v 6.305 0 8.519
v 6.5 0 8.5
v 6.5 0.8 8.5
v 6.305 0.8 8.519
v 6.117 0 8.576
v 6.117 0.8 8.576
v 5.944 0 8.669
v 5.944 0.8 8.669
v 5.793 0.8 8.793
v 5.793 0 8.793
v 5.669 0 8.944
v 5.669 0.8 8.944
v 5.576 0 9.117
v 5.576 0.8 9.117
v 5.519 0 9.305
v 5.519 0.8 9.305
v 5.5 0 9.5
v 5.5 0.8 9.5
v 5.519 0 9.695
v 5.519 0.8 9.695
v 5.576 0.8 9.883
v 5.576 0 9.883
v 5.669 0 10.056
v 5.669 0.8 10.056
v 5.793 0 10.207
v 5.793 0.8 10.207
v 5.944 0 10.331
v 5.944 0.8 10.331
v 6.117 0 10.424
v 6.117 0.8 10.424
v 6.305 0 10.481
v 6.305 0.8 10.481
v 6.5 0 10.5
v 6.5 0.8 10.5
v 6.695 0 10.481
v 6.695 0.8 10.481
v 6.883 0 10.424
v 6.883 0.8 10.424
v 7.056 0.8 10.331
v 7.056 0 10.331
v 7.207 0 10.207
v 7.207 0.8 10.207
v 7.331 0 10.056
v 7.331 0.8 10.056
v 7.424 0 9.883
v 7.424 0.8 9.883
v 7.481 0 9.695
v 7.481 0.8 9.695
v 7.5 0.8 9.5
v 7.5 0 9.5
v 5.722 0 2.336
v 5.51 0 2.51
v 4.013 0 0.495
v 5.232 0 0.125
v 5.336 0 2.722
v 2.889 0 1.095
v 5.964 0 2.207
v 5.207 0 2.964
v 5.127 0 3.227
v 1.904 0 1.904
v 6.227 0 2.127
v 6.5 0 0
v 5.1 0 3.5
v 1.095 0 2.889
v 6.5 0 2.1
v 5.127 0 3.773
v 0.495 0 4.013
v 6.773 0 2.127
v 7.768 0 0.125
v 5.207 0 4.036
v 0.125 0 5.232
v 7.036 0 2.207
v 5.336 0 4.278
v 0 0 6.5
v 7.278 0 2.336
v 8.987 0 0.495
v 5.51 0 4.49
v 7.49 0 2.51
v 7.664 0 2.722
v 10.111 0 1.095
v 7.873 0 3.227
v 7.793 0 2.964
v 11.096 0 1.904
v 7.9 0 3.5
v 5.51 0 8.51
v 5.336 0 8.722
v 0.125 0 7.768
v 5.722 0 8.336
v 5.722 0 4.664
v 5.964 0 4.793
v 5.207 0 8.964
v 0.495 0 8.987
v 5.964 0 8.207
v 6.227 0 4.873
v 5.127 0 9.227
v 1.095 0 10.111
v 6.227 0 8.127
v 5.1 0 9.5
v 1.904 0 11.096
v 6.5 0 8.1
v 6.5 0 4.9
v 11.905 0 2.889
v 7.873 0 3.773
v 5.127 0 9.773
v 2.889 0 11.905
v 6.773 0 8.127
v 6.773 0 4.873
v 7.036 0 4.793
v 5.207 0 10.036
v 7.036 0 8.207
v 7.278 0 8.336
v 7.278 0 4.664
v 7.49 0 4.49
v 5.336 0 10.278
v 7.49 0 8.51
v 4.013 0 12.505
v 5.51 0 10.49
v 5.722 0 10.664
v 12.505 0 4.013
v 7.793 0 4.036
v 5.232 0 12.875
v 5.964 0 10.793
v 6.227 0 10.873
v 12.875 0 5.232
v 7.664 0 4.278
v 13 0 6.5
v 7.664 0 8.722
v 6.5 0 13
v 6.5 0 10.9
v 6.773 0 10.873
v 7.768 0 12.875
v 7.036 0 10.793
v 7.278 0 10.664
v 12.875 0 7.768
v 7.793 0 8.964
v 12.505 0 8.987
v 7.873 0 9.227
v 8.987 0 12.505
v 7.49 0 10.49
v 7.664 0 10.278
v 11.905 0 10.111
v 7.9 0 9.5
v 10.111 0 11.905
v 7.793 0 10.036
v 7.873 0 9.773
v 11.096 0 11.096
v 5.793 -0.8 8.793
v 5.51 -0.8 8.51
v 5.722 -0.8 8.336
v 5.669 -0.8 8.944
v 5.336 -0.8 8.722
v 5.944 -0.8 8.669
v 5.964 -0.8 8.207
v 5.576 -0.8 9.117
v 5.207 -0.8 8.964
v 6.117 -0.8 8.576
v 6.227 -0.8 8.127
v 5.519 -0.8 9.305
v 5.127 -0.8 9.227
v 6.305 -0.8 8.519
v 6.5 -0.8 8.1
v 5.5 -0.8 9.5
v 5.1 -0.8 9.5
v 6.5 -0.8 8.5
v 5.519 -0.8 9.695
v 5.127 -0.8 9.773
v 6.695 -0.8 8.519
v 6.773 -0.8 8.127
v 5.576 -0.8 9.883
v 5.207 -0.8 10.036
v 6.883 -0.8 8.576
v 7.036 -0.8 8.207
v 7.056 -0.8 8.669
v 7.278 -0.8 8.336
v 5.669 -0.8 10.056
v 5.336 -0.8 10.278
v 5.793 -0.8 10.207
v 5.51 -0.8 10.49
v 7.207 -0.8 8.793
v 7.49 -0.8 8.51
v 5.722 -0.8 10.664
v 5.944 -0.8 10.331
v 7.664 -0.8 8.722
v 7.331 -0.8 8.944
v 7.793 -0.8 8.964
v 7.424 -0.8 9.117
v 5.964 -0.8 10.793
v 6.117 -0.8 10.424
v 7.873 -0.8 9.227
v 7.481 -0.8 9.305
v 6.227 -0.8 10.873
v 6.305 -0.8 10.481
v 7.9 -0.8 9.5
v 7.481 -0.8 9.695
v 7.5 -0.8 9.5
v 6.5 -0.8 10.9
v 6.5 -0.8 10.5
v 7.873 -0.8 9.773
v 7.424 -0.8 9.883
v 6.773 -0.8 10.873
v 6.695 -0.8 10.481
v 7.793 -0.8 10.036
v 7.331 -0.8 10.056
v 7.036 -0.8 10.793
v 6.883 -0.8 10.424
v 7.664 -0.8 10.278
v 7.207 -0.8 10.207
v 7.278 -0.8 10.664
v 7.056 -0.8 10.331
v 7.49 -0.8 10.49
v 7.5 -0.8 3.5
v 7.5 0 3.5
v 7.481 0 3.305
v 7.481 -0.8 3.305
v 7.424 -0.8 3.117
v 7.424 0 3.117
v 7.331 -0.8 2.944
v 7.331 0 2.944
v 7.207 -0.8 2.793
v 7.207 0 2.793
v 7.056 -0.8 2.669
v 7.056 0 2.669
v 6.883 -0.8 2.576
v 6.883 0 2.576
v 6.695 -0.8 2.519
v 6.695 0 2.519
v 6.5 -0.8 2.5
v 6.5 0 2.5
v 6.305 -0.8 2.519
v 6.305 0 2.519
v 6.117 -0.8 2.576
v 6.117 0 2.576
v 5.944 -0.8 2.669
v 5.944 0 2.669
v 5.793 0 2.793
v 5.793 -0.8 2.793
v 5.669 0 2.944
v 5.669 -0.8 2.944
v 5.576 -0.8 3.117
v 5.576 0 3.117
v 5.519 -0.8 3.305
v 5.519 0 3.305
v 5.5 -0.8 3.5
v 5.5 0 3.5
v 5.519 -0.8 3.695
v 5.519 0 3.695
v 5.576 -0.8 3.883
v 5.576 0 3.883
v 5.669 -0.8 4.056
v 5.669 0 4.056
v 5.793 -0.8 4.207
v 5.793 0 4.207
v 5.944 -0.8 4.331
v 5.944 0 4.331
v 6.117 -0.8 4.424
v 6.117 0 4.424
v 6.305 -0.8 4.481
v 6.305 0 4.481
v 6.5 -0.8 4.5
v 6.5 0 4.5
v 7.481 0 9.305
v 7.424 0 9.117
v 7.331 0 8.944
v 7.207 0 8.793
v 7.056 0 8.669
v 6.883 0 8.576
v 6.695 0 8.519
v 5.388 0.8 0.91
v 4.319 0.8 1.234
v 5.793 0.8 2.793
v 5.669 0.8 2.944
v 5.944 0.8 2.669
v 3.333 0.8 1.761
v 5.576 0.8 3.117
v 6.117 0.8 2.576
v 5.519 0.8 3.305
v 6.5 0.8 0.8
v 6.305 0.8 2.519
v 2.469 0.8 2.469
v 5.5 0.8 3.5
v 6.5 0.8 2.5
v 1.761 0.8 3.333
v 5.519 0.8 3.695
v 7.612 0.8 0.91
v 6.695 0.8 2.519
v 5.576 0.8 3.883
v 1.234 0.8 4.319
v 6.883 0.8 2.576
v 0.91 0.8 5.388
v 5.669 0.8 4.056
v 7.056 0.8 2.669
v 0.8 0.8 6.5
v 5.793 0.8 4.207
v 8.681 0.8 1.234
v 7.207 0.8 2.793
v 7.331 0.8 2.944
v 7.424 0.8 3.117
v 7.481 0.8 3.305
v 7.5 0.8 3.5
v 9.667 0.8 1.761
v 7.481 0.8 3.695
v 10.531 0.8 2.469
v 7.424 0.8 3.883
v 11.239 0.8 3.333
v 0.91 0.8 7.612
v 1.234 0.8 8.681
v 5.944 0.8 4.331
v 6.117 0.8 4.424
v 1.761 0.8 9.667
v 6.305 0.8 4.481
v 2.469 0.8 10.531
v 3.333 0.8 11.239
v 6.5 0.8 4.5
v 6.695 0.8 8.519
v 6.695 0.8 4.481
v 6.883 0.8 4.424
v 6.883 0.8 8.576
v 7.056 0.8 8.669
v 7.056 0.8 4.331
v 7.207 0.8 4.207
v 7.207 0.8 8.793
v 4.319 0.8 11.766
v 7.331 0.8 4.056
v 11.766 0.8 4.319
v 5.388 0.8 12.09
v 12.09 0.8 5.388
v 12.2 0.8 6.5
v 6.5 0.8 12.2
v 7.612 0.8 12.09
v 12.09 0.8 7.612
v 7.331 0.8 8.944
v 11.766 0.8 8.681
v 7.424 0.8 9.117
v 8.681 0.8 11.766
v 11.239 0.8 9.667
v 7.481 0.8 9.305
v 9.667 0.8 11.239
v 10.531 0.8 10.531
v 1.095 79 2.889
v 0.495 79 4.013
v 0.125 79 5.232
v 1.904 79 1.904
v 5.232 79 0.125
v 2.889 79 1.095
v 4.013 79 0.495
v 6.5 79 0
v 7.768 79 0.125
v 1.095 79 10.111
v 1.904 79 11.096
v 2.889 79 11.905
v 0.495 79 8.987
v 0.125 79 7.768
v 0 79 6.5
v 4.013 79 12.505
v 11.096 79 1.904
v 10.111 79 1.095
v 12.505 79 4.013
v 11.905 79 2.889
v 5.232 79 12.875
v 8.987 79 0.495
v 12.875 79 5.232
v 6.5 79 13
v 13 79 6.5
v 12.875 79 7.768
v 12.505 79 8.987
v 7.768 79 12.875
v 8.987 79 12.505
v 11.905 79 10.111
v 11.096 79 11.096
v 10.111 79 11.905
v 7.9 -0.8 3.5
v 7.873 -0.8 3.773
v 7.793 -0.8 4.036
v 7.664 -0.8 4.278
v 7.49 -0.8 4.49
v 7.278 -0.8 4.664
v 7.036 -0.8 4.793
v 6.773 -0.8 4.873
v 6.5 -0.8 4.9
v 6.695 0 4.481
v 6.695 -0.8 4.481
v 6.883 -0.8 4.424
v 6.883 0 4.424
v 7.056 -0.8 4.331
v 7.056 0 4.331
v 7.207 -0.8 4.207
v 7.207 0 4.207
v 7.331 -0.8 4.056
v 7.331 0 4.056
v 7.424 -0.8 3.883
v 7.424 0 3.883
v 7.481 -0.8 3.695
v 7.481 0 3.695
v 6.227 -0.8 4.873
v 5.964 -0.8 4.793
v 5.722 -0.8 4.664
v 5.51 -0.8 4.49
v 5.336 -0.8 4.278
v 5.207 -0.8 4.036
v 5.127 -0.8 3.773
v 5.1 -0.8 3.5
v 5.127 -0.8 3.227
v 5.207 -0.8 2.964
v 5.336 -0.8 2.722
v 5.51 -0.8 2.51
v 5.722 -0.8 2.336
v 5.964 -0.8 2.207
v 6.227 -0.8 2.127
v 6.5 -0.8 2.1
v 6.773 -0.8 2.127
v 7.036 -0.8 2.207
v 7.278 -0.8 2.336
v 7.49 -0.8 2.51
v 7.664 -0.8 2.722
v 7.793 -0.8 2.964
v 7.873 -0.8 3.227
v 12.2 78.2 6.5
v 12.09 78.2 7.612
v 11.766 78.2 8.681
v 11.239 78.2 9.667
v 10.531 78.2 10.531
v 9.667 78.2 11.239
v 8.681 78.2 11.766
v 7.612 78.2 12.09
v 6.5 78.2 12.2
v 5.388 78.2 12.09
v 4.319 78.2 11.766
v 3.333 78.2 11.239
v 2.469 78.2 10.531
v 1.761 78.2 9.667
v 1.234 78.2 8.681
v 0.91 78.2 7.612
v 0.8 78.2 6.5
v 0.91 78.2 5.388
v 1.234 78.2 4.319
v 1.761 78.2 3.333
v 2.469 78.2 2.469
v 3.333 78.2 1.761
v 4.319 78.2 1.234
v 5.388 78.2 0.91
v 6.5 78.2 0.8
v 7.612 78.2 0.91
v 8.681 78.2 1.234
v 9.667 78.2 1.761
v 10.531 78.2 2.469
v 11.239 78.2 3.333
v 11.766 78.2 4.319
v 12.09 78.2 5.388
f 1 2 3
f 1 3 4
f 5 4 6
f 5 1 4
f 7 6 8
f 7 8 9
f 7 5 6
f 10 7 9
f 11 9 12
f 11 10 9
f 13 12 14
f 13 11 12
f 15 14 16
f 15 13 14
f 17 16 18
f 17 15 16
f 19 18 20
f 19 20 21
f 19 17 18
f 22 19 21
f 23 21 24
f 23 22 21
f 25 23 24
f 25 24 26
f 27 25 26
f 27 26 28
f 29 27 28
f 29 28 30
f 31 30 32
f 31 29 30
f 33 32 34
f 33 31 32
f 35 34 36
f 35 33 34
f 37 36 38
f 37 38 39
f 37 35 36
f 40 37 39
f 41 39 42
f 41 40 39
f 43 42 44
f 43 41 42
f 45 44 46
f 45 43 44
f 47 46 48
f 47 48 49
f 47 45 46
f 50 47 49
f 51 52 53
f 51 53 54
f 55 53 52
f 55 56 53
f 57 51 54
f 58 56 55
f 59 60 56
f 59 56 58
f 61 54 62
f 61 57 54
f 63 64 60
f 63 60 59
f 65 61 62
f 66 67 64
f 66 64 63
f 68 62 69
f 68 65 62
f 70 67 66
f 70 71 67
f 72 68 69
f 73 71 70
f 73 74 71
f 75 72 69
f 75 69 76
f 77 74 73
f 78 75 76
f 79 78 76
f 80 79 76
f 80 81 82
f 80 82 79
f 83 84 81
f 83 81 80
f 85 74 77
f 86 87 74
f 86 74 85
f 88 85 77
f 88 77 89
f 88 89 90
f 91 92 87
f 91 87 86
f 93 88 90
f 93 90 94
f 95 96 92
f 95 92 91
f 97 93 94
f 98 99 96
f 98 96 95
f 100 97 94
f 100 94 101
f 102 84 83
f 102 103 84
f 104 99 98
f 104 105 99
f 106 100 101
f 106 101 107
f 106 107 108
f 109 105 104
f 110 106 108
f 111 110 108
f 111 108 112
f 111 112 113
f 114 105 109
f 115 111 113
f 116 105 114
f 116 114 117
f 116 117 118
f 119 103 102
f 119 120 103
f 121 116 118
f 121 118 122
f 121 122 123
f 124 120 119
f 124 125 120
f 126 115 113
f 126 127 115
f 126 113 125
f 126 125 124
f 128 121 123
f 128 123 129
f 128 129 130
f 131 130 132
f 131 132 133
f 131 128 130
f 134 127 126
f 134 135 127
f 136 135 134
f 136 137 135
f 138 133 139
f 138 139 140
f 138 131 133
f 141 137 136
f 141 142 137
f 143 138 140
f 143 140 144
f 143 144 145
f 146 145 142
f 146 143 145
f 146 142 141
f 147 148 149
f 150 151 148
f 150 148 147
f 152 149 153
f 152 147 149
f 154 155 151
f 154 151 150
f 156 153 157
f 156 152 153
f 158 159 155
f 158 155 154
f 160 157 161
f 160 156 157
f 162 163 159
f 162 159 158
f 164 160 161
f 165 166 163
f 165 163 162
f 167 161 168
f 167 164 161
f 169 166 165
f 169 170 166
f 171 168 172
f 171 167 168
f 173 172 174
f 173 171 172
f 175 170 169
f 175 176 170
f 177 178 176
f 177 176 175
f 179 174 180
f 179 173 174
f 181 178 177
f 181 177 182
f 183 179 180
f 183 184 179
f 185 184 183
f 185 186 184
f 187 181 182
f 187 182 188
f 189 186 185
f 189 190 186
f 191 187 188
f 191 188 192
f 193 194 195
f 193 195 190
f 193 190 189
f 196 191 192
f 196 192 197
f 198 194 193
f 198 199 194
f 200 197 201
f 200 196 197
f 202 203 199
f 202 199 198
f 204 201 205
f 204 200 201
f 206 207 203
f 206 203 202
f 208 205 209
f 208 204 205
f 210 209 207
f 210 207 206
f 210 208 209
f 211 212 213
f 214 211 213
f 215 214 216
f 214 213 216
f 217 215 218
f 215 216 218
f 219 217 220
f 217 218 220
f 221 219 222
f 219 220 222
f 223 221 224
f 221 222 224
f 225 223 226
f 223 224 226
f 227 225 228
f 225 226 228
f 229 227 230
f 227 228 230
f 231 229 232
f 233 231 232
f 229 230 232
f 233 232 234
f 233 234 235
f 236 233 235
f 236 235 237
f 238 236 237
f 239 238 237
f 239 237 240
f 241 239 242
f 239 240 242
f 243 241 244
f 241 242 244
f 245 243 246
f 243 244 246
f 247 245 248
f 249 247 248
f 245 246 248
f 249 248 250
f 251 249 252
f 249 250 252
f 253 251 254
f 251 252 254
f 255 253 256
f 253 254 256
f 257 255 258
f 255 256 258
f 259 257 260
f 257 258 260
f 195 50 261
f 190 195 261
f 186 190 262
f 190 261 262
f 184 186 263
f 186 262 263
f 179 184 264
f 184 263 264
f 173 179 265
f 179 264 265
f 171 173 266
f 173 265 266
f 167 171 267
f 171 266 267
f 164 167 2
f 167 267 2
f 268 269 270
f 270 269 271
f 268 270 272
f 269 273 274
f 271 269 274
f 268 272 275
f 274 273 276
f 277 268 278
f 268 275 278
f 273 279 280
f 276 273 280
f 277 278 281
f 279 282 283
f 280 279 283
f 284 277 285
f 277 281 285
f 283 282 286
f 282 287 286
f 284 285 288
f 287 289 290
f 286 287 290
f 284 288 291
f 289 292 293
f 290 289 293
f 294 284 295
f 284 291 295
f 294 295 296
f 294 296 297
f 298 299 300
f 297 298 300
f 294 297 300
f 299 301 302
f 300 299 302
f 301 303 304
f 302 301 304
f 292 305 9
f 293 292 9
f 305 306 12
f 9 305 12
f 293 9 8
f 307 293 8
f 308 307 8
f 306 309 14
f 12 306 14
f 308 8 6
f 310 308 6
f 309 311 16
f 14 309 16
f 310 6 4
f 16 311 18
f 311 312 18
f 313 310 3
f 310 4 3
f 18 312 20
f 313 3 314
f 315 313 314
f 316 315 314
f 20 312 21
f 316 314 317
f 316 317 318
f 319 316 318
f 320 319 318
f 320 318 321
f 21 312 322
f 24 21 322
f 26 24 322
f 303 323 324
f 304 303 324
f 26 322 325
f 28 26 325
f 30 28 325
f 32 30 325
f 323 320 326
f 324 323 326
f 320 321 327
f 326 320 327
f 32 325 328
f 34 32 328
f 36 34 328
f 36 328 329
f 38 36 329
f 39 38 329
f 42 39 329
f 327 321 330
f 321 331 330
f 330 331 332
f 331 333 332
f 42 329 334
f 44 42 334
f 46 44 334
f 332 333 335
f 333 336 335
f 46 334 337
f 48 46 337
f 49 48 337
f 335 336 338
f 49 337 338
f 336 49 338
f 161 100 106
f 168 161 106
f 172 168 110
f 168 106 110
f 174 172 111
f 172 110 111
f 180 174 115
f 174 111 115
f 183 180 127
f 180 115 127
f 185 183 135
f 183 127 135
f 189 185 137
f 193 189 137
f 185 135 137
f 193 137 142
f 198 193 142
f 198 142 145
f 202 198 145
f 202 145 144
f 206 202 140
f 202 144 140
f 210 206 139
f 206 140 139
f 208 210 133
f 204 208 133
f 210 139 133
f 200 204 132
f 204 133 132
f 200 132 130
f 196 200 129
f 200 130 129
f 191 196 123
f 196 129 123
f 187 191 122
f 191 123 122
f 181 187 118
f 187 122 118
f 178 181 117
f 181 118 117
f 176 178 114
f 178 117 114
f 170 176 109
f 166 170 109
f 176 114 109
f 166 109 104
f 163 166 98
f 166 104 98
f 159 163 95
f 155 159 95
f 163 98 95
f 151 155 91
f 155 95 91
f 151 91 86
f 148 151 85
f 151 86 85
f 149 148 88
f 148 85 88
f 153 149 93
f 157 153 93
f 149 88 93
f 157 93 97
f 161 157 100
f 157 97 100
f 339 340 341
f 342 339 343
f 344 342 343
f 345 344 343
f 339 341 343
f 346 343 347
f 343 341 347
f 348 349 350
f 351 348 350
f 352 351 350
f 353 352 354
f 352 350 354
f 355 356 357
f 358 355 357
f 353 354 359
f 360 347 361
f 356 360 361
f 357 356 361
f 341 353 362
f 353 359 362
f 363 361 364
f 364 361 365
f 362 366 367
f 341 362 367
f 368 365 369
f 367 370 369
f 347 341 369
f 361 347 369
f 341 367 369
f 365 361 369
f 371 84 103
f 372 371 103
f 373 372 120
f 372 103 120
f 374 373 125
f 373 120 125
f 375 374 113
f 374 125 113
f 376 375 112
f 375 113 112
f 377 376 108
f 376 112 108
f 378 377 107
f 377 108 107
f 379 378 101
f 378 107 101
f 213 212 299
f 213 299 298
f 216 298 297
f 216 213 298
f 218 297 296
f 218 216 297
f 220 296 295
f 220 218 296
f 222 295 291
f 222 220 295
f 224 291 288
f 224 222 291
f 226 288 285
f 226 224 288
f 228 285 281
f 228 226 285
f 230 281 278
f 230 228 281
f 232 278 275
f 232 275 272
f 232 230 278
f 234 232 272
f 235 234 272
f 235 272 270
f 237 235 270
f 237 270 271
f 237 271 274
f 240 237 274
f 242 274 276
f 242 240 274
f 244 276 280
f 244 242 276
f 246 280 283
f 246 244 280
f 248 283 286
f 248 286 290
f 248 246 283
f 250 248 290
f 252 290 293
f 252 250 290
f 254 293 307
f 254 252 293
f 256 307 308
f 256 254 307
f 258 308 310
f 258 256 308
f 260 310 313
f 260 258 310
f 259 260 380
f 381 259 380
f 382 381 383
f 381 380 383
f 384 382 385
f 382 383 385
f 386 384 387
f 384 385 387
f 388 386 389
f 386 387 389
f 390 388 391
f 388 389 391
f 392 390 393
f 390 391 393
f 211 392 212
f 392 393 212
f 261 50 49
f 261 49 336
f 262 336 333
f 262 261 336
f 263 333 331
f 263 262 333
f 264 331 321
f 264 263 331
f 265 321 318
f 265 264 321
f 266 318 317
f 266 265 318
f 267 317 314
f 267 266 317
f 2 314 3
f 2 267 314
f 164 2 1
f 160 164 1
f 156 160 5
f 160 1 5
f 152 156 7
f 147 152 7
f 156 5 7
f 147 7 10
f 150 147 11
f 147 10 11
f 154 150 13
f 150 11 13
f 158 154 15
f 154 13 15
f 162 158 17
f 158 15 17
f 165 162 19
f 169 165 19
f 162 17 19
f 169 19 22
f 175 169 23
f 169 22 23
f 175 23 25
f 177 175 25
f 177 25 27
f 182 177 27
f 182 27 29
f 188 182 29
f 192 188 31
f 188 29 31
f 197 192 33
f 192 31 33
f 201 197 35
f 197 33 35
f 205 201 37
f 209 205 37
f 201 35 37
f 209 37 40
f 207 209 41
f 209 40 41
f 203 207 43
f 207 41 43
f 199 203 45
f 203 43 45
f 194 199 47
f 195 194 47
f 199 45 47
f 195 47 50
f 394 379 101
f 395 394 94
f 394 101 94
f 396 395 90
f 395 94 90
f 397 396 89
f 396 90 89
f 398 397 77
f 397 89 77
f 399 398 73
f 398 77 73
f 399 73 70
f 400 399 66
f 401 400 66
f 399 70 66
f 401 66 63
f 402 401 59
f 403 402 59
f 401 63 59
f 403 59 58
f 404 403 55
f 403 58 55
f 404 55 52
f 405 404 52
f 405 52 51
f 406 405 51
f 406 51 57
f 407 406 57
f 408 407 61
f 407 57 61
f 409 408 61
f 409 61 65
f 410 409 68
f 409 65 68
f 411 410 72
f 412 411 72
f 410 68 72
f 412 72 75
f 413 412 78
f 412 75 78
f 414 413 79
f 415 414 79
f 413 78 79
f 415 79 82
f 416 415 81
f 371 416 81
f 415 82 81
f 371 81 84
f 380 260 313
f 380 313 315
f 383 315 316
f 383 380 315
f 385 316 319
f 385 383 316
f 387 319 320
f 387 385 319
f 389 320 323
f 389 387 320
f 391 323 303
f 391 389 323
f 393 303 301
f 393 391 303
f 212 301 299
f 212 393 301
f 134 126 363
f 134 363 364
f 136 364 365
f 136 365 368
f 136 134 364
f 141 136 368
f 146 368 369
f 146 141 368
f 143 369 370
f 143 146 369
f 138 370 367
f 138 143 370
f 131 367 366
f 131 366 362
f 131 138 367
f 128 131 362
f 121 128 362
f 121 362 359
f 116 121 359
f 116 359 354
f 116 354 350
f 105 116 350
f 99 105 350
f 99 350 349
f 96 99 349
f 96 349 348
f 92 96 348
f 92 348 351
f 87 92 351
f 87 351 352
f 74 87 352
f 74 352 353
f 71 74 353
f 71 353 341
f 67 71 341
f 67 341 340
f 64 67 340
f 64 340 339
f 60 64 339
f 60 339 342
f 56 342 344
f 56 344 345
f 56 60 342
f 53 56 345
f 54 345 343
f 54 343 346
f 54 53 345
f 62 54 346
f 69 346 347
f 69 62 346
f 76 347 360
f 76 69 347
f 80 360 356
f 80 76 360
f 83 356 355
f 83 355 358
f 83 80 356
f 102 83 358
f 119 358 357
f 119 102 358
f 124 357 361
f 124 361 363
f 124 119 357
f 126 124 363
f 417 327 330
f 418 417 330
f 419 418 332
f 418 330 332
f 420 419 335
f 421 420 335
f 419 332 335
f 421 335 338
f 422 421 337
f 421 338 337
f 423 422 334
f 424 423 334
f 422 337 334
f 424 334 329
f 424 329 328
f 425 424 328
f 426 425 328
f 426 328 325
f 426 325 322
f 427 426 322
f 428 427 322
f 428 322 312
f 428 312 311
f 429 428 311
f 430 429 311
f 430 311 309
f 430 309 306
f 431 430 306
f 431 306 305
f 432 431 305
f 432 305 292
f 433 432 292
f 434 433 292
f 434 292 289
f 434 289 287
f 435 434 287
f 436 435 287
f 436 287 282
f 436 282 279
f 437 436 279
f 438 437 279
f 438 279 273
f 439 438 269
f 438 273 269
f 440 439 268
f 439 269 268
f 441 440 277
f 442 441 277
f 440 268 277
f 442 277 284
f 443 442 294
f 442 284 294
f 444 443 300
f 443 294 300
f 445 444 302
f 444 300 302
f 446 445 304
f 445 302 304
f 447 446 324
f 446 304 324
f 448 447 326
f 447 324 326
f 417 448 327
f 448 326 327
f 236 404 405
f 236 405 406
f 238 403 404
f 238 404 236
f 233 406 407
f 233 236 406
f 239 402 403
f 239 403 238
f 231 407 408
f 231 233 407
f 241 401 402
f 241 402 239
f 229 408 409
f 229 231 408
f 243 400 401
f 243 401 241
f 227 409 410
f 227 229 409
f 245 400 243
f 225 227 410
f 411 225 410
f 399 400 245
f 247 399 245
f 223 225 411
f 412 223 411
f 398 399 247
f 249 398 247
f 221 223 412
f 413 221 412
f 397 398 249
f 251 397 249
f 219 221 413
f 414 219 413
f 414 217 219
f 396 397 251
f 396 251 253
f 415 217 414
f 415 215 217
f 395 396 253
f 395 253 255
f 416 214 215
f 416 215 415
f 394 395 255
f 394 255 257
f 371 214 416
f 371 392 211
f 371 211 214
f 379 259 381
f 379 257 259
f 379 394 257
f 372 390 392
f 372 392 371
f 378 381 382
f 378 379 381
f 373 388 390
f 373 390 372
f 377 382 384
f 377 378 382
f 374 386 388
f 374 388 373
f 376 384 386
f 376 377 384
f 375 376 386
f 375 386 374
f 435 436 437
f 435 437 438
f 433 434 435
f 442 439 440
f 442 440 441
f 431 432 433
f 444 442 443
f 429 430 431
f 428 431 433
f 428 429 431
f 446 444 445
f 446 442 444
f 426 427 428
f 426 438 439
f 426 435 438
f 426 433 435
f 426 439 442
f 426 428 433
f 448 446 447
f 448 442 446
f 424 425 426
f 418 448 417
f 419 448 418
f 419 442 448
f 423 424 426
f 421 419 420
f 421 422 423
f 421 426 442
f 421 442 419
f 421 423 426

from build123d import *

# Parameters (mm, degrees)
F0_R     = 6.5
F1_DEPTH = 79
F2_T     = -0.8
F3_DEPTH = 0.8
F4_DEPTH = 0.8


with BuildPart() as f1:
    # F0 (on Front) → F1 (new body)
    with BuildSketch(Plane.XZ):
        with Locations((6.5, 6.5)):
            Circle(F0_R)
        with BuildLine():
            ThreePointArc((7.9, 3.5), (5.5100505063, 2.5100505063), (6.5, 4.9))
            ThreePointArc((6.5, 4.9), (7.4899494937, 4.4899494937), (7.9, 3.5))
        make_face(mode=Mode.SUBTRACT)
        with BuildLine():
            ThreePointArc((6.5, 8.1), (5.5100505063, 10.4899494937), (7.9, 9.5))
            ThreePointArc((7.9, 9.5), (7.4899494937, 8.5100505063), (6.5, 8.1))
        make_face(mode=Mode.SUBTRACT)
        with BuildLine():
            ThreePointArc((6.5, 8.1), (7.4899494937, 8.5100505063), (7.9, 9.5))
            ThreePointArc((7.9, 9.5), (5.5100505063, 10.4899494937), (6.5, 8.1))
        make_face()
        with BuildLine():
            ThreePointArc((7.5, 9.5), (7.2071067812, 8.7928932188), (6.5, 8.5))
            ThreePointArc((6.5, 8.5), (5.7928932188, 10.2071067812), (7.5, 9.5))
        make_face(mode=Mode.SUBTRACT)
        with BuildLine():
            ThreePointArc((7.9, 3.5), (7.4899494937, 4.4899494937), (6.5, 4.9))
            ThreePointArc((6.5, 4.9), (5.5100505063, 2.5100505063), (7.9, 3.5))
        make_face()
        with BuildLine():
            ThreePointArc((7.5, 3.5), (5.7928932188, 2.7928932188), (6.5, 4.5))
            ThreePointArc((6.5, 4.5), (7.2071067812, 4.2071067812), (7.5, 3.5))
        make_face(mode=Mode.SUBTRACT)
        with BuildLine():
            ThreePointArc((7.5, 9.5), (5.7928932188, 10.2071067812), (6.5, 8.5))
            ThreePointArc((6.5, 8.5), (7.2071067812, 8.7928932188), (7.5, 9.5))
        make_face()
        with BuildLine():
            ThreePointArc((7.5, 3.5), (7.2071067812, 4.2071067812), (6.5, 4.5))
            ThreePointArc((6.5, 4.5), (5.7928932188, 2.7928932188), (7.5, 3.5))
        make_face()
    extrude(amount=-F1_DEPTH)

    # F2
    f2_openings = [f1.faces().sort_by_distance(p)[0] for p in [
        (6.5, 0, 6.5),
    ]]
    offset(amount=F2_T, openings=f2_openings)

    # F0 (on Front) → F3 (join)
    with BuildSketch(Plane.XZ):
        with Locations((6.5, 6.5)):
            Circle(F0_R)
        with BuildLine():
            ThreePointArc((7.9, 3.5), (5.5100505063, 2.5100505063), (6.5, 4.9))
            ThreePointArc((6.5, 4.9), (7.4899494937, 4.4899494937), (7.9, 3.5))
        make_face(mode=Mode.SUBTRACT)
        with BuildLine():
            ThreePointArc((6.5, 8.1), (5.5100505063, 10.4899494937), (7.9, 9.5))
            ThreePointArc((7.9, 9.5), (7.4899494937, 8.5100505063), (6.5, 8.1))
        make_face(mode=Mode.SUBTRACT)
    extrude(amount=-F3_DEPTH)

    # F0 (on Front) → F4 (join, symmetric)
    with BuildSketch(Plane.XZ):
        with BuildLine():
            ThreePointArc((6.5, 8.1), (7.4899494937, 8.5100505063), (7.9, 9.5))
            ThreePointArc((7.9, 9.5), (5.5100505063, 10.4899494937), (6.5, 8.1))
        make_face()
        with BuildLine():
            ThreePointArc((7.5, 9.5), (7.2071067812, 8.7928932188), (6.5, 8.5))
            ThreePointArc((6.5, 8.5), (5.7928932188, 10.2071067812), (7.5, 9.5))
        make_face(mode=Mode.SUBTRACT)
        with BuildLine():
            ThreePointArc((7.9, 3.5), (7.4899494937, 4.4899494937), (6.5, 4.9))
            ThreePointArc((6.5, 4.9), (5.5100505063, 2.5100505063), (7.9, 3.5))
        make_face()
        with BuildLine():
            ThreePointArc((7.5, 3.5), (5.7928932188, 2.7928932188), (6.5, 4.5))
            ThreePointArc((6.5, 4.5), (7.2071067812, 4.2071067812), (7.5, 3.5))
        make_face(mode=Mode.SUBTRACT)
    extrude(amount=F4_DEPTH, both=True)


solid = f1.part
